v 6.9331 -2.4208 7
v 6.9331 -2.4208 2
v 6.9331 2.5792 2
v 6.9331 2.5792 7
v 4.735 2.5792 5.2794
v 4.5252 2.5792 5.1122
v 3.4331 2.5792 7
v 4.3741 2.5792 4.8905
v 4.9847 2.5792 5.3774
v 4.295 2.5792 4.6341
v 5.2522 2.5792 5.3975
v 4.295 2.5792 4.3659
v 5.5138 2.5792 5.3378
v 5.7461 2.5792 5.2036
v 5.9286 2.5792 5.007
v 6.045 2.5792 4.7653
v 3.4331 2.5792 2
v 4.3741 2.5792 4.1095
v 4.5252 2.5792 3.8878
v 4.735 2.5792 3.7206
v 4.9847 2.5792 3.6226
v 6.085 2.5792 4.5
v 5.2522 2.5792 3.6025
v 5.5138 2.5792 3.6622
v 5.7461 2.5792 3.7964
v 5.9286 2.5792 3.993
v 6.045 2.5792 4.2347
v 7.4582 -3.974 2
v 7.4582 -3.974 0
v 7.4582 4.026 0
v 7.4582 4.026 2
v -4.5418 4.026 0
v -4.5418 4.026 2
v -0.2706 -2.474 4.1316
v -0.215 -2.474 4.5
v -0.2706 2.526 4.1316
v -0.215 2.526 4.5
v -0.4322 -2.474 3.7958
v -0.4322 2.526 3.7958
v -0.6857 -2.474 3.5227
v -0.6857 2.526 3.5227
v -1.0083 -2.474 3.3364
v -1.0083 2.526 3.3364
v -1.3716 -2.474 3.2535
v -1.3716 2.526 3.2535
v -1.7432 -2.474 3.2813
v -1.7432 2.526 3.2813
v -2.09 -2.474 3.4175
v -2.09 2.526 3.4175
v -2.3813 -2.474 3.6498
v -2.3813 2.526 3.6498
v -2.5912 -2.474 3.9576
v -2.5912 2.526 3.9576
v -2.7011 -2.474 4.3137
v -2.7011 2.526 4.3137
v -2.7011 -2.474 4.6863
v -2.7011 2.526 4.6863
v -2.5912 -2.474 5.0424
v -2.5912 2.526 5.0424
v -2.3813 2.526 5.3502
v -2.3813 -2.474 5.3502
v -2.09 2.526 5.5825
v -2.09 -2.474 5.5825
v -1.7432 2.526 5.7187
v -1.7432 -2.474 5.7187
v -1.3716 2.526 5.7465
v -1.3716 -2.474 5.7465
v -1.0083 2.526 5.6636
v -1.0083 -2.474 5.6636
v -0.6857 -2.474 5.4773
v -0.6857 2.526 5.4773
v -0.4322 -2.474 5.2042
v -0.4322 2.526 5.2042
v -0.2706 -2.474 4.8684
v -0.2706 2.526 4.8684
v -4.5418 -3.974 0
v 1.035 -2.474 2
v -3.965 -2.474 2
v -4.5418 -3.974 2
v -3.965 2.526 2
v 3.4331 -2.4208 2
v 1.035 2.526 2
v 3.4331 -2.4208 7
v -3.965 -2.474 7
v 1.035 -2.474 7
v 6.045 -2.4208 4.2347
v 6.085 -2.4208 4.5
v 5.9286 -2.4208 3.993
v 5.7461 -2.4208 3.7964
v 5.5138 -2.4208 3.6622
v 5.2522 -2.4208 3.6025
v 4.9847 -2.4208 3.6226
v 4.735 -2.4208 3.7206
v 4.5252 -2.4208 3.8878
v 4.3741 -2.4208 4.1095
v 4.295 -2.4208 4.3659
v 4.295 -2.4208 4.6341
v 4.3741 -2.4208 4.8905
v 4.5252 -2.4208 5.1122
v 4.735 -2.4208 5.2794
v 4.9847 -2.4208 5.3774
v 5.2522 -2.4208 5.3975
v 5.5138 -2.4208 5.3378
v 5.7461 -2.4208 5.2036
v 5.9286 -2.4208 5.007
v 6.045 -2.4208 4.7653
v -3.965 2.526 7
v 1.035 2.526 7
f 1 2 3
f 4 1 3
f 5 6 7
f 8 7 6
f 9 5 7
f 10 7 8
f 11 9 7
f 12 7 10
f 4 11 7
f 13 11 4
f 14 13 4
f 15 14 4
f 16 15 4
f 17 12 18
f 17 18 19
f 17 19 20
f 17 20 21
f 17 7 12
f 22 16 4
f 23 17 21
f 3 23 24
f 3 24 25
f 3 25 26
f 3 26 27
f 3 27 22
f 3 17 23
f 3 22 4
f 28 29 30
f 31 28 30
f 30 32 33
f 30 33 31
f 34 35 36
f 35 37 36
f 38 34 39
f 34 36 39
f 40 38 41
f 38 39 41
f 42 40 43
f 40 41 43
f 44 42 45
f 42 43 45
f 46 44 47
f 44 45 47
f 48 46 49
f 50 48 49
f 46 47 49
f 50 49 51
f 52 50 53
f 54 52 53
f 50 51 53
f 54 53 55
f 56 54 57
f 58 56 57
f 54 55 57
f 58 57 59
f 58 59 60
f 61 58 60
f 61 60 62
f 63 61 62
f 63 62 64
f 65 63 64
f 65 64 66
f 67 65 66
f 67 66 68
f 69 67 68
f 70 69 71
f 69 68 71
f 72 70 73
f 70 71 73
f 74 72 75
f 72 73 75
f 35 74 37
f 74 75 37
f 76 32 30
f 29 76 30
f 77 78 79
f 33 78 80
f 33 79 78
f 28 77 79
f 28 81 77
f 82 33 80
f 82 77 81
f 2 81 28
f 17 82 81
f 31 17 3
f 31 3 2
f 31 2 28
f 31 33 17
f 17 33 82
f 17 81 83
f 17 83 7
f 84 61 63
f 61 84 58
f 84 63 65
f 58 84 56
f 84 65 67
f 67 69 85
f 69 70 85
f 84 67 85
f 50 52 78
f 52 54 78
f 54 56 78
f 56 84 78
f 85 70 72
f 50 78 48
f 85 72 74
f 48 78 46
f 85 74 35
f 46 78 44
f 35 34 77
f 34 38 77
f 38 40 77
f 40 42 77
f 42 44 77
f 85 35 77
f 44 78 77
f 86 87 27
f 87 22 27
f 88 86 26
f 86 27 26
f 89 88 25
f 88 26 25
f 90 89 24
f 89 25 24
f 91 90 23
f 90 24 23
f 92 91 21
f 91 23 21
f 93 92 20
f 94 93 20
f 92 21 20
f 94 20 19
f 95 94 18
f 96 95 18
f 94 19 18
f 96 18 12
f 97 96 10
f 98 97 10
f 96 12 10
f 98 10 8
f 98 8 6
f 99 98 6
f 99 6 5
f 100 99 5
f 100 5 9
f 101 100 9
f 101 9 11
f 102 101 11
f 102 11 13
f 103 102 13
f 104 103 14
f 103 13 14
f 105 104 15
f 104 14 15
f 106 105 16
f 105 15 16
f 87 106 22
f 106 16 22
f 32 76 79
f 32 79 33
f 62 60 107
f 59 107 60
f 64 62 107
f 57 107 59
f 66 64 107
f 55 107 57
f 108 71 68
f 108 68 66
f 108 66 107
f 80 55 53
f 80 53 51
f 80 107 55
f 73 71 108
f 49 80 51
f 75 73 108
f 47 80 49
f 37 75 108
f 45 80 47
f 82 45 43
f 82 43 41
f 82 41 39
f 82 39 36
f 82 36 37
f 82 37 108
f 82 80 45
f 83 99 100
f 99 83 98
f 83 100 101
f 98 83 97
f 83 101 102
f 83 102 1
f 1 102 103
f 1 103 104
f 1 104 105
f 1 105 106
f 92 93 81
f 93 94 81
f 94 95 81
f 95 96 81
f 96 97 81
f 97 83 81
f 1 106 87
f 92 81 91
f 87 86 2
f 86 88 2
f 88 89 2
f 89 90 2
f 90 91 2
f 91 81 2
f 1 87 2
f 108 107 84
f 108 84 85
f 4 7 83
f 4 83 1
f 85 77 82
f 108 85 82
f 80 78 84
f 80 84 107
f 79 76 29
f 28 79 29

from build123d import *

# Parameters (mm, degrees)
SKETCH_1_W               = 12
SKETCH_1_H               = 8
EXTRUDE_1_DEPTH          = 2
SKETCH_3_W               = 5
SKETCH_3_H               = 5
EXTRUDE_2_DEPTH          = 7
SKETCH_5_R               = 1.25
CUT_EXTRUDE_2_DEPTH      = 5
CUT_EXTRUDE_2_DEPTH_BACK = 5
SKETCH_6_W               = 3.5
SKETCH_6_H               = 5
EXTRUDE_3_DEPTH          = 7
SKETCH_8_R               = 0.9
CUT_EXTRUDE_3_DEPTH      = 7
CUT_EXTRUDE_3_DEPTH_BACK = 7


with BuildPart() as part:
    # 草圖1 → 填料-伸長1 (new body)
    with BuildSketch(Plane.XY):
        with Locations((1.458189105, 0.025974026)):
            Rectangle(SKETCH_1_W, SKETCH_1_H)
    extrude(amount=EXTRUDE_1_DEPTH)

    # 草圖3 → 填料-伸長2 (add)
    with BuildSketch(Plane.XY):
        with Locations((-1.465017587, 0.025974026)):
            Rectangle(SKETCH_3_W, SKETCH_3_H)
    extrude(amount=EXTRUDE_2_DEPTH)

    # 草圖5 → 除料-伸長2 (cut, two sides)
    with BuildSketch(Plane(origin=(0, 0, 0), x_dir=(1, 0, 0), z_dir=(0, 1, 0))) as cut_extrude_2_sk:
        with Locations((-1.465017587, -4.5)):
            Circle(SKETCH_5_R)
    extrude(amount=CUT_EXTRUDE_2_DEPTH, mode=Mode.SUBTRACT)
    extrude(cut_extrude_2_sk.sketch, amount=-CUT_EXTRUDE_2_DEPTH_BACK, mode=Mode.SUBTRACT)

    # 草圖6 → 填料-伸長3 (add)
    with BuildSketch(Plane.XY):
        with Locations((5.183136142, 0.079162411)):
            Rectangle(SKETCH_6_W, SKETCH_6_H)
    extrude(amount=EXTRUDE_3_DEPTH)

    # 草圖8 → 除料-伸長3 (cut, two sides)
    with BuildSketch(Plane(origin=(0, 0, 0), x_dir=(1, 0, 0), z_dir=(0, 1, 0))) as cut_extrude_3_sk:
        with Locations((5.184982413, -4.5)):
            Circle(SKETCH_8_R)
    extrude(amount=CUT_EXTRUDE_3_DEPTH, mode=Mode.SUBTRACT)
    extrude(cut_extrude_3_sk.sketch, amount=-CUT_EXTRUDE_3_DEPTH_BACK, mode=Mode.SUBTRACT)


solid = part.part
